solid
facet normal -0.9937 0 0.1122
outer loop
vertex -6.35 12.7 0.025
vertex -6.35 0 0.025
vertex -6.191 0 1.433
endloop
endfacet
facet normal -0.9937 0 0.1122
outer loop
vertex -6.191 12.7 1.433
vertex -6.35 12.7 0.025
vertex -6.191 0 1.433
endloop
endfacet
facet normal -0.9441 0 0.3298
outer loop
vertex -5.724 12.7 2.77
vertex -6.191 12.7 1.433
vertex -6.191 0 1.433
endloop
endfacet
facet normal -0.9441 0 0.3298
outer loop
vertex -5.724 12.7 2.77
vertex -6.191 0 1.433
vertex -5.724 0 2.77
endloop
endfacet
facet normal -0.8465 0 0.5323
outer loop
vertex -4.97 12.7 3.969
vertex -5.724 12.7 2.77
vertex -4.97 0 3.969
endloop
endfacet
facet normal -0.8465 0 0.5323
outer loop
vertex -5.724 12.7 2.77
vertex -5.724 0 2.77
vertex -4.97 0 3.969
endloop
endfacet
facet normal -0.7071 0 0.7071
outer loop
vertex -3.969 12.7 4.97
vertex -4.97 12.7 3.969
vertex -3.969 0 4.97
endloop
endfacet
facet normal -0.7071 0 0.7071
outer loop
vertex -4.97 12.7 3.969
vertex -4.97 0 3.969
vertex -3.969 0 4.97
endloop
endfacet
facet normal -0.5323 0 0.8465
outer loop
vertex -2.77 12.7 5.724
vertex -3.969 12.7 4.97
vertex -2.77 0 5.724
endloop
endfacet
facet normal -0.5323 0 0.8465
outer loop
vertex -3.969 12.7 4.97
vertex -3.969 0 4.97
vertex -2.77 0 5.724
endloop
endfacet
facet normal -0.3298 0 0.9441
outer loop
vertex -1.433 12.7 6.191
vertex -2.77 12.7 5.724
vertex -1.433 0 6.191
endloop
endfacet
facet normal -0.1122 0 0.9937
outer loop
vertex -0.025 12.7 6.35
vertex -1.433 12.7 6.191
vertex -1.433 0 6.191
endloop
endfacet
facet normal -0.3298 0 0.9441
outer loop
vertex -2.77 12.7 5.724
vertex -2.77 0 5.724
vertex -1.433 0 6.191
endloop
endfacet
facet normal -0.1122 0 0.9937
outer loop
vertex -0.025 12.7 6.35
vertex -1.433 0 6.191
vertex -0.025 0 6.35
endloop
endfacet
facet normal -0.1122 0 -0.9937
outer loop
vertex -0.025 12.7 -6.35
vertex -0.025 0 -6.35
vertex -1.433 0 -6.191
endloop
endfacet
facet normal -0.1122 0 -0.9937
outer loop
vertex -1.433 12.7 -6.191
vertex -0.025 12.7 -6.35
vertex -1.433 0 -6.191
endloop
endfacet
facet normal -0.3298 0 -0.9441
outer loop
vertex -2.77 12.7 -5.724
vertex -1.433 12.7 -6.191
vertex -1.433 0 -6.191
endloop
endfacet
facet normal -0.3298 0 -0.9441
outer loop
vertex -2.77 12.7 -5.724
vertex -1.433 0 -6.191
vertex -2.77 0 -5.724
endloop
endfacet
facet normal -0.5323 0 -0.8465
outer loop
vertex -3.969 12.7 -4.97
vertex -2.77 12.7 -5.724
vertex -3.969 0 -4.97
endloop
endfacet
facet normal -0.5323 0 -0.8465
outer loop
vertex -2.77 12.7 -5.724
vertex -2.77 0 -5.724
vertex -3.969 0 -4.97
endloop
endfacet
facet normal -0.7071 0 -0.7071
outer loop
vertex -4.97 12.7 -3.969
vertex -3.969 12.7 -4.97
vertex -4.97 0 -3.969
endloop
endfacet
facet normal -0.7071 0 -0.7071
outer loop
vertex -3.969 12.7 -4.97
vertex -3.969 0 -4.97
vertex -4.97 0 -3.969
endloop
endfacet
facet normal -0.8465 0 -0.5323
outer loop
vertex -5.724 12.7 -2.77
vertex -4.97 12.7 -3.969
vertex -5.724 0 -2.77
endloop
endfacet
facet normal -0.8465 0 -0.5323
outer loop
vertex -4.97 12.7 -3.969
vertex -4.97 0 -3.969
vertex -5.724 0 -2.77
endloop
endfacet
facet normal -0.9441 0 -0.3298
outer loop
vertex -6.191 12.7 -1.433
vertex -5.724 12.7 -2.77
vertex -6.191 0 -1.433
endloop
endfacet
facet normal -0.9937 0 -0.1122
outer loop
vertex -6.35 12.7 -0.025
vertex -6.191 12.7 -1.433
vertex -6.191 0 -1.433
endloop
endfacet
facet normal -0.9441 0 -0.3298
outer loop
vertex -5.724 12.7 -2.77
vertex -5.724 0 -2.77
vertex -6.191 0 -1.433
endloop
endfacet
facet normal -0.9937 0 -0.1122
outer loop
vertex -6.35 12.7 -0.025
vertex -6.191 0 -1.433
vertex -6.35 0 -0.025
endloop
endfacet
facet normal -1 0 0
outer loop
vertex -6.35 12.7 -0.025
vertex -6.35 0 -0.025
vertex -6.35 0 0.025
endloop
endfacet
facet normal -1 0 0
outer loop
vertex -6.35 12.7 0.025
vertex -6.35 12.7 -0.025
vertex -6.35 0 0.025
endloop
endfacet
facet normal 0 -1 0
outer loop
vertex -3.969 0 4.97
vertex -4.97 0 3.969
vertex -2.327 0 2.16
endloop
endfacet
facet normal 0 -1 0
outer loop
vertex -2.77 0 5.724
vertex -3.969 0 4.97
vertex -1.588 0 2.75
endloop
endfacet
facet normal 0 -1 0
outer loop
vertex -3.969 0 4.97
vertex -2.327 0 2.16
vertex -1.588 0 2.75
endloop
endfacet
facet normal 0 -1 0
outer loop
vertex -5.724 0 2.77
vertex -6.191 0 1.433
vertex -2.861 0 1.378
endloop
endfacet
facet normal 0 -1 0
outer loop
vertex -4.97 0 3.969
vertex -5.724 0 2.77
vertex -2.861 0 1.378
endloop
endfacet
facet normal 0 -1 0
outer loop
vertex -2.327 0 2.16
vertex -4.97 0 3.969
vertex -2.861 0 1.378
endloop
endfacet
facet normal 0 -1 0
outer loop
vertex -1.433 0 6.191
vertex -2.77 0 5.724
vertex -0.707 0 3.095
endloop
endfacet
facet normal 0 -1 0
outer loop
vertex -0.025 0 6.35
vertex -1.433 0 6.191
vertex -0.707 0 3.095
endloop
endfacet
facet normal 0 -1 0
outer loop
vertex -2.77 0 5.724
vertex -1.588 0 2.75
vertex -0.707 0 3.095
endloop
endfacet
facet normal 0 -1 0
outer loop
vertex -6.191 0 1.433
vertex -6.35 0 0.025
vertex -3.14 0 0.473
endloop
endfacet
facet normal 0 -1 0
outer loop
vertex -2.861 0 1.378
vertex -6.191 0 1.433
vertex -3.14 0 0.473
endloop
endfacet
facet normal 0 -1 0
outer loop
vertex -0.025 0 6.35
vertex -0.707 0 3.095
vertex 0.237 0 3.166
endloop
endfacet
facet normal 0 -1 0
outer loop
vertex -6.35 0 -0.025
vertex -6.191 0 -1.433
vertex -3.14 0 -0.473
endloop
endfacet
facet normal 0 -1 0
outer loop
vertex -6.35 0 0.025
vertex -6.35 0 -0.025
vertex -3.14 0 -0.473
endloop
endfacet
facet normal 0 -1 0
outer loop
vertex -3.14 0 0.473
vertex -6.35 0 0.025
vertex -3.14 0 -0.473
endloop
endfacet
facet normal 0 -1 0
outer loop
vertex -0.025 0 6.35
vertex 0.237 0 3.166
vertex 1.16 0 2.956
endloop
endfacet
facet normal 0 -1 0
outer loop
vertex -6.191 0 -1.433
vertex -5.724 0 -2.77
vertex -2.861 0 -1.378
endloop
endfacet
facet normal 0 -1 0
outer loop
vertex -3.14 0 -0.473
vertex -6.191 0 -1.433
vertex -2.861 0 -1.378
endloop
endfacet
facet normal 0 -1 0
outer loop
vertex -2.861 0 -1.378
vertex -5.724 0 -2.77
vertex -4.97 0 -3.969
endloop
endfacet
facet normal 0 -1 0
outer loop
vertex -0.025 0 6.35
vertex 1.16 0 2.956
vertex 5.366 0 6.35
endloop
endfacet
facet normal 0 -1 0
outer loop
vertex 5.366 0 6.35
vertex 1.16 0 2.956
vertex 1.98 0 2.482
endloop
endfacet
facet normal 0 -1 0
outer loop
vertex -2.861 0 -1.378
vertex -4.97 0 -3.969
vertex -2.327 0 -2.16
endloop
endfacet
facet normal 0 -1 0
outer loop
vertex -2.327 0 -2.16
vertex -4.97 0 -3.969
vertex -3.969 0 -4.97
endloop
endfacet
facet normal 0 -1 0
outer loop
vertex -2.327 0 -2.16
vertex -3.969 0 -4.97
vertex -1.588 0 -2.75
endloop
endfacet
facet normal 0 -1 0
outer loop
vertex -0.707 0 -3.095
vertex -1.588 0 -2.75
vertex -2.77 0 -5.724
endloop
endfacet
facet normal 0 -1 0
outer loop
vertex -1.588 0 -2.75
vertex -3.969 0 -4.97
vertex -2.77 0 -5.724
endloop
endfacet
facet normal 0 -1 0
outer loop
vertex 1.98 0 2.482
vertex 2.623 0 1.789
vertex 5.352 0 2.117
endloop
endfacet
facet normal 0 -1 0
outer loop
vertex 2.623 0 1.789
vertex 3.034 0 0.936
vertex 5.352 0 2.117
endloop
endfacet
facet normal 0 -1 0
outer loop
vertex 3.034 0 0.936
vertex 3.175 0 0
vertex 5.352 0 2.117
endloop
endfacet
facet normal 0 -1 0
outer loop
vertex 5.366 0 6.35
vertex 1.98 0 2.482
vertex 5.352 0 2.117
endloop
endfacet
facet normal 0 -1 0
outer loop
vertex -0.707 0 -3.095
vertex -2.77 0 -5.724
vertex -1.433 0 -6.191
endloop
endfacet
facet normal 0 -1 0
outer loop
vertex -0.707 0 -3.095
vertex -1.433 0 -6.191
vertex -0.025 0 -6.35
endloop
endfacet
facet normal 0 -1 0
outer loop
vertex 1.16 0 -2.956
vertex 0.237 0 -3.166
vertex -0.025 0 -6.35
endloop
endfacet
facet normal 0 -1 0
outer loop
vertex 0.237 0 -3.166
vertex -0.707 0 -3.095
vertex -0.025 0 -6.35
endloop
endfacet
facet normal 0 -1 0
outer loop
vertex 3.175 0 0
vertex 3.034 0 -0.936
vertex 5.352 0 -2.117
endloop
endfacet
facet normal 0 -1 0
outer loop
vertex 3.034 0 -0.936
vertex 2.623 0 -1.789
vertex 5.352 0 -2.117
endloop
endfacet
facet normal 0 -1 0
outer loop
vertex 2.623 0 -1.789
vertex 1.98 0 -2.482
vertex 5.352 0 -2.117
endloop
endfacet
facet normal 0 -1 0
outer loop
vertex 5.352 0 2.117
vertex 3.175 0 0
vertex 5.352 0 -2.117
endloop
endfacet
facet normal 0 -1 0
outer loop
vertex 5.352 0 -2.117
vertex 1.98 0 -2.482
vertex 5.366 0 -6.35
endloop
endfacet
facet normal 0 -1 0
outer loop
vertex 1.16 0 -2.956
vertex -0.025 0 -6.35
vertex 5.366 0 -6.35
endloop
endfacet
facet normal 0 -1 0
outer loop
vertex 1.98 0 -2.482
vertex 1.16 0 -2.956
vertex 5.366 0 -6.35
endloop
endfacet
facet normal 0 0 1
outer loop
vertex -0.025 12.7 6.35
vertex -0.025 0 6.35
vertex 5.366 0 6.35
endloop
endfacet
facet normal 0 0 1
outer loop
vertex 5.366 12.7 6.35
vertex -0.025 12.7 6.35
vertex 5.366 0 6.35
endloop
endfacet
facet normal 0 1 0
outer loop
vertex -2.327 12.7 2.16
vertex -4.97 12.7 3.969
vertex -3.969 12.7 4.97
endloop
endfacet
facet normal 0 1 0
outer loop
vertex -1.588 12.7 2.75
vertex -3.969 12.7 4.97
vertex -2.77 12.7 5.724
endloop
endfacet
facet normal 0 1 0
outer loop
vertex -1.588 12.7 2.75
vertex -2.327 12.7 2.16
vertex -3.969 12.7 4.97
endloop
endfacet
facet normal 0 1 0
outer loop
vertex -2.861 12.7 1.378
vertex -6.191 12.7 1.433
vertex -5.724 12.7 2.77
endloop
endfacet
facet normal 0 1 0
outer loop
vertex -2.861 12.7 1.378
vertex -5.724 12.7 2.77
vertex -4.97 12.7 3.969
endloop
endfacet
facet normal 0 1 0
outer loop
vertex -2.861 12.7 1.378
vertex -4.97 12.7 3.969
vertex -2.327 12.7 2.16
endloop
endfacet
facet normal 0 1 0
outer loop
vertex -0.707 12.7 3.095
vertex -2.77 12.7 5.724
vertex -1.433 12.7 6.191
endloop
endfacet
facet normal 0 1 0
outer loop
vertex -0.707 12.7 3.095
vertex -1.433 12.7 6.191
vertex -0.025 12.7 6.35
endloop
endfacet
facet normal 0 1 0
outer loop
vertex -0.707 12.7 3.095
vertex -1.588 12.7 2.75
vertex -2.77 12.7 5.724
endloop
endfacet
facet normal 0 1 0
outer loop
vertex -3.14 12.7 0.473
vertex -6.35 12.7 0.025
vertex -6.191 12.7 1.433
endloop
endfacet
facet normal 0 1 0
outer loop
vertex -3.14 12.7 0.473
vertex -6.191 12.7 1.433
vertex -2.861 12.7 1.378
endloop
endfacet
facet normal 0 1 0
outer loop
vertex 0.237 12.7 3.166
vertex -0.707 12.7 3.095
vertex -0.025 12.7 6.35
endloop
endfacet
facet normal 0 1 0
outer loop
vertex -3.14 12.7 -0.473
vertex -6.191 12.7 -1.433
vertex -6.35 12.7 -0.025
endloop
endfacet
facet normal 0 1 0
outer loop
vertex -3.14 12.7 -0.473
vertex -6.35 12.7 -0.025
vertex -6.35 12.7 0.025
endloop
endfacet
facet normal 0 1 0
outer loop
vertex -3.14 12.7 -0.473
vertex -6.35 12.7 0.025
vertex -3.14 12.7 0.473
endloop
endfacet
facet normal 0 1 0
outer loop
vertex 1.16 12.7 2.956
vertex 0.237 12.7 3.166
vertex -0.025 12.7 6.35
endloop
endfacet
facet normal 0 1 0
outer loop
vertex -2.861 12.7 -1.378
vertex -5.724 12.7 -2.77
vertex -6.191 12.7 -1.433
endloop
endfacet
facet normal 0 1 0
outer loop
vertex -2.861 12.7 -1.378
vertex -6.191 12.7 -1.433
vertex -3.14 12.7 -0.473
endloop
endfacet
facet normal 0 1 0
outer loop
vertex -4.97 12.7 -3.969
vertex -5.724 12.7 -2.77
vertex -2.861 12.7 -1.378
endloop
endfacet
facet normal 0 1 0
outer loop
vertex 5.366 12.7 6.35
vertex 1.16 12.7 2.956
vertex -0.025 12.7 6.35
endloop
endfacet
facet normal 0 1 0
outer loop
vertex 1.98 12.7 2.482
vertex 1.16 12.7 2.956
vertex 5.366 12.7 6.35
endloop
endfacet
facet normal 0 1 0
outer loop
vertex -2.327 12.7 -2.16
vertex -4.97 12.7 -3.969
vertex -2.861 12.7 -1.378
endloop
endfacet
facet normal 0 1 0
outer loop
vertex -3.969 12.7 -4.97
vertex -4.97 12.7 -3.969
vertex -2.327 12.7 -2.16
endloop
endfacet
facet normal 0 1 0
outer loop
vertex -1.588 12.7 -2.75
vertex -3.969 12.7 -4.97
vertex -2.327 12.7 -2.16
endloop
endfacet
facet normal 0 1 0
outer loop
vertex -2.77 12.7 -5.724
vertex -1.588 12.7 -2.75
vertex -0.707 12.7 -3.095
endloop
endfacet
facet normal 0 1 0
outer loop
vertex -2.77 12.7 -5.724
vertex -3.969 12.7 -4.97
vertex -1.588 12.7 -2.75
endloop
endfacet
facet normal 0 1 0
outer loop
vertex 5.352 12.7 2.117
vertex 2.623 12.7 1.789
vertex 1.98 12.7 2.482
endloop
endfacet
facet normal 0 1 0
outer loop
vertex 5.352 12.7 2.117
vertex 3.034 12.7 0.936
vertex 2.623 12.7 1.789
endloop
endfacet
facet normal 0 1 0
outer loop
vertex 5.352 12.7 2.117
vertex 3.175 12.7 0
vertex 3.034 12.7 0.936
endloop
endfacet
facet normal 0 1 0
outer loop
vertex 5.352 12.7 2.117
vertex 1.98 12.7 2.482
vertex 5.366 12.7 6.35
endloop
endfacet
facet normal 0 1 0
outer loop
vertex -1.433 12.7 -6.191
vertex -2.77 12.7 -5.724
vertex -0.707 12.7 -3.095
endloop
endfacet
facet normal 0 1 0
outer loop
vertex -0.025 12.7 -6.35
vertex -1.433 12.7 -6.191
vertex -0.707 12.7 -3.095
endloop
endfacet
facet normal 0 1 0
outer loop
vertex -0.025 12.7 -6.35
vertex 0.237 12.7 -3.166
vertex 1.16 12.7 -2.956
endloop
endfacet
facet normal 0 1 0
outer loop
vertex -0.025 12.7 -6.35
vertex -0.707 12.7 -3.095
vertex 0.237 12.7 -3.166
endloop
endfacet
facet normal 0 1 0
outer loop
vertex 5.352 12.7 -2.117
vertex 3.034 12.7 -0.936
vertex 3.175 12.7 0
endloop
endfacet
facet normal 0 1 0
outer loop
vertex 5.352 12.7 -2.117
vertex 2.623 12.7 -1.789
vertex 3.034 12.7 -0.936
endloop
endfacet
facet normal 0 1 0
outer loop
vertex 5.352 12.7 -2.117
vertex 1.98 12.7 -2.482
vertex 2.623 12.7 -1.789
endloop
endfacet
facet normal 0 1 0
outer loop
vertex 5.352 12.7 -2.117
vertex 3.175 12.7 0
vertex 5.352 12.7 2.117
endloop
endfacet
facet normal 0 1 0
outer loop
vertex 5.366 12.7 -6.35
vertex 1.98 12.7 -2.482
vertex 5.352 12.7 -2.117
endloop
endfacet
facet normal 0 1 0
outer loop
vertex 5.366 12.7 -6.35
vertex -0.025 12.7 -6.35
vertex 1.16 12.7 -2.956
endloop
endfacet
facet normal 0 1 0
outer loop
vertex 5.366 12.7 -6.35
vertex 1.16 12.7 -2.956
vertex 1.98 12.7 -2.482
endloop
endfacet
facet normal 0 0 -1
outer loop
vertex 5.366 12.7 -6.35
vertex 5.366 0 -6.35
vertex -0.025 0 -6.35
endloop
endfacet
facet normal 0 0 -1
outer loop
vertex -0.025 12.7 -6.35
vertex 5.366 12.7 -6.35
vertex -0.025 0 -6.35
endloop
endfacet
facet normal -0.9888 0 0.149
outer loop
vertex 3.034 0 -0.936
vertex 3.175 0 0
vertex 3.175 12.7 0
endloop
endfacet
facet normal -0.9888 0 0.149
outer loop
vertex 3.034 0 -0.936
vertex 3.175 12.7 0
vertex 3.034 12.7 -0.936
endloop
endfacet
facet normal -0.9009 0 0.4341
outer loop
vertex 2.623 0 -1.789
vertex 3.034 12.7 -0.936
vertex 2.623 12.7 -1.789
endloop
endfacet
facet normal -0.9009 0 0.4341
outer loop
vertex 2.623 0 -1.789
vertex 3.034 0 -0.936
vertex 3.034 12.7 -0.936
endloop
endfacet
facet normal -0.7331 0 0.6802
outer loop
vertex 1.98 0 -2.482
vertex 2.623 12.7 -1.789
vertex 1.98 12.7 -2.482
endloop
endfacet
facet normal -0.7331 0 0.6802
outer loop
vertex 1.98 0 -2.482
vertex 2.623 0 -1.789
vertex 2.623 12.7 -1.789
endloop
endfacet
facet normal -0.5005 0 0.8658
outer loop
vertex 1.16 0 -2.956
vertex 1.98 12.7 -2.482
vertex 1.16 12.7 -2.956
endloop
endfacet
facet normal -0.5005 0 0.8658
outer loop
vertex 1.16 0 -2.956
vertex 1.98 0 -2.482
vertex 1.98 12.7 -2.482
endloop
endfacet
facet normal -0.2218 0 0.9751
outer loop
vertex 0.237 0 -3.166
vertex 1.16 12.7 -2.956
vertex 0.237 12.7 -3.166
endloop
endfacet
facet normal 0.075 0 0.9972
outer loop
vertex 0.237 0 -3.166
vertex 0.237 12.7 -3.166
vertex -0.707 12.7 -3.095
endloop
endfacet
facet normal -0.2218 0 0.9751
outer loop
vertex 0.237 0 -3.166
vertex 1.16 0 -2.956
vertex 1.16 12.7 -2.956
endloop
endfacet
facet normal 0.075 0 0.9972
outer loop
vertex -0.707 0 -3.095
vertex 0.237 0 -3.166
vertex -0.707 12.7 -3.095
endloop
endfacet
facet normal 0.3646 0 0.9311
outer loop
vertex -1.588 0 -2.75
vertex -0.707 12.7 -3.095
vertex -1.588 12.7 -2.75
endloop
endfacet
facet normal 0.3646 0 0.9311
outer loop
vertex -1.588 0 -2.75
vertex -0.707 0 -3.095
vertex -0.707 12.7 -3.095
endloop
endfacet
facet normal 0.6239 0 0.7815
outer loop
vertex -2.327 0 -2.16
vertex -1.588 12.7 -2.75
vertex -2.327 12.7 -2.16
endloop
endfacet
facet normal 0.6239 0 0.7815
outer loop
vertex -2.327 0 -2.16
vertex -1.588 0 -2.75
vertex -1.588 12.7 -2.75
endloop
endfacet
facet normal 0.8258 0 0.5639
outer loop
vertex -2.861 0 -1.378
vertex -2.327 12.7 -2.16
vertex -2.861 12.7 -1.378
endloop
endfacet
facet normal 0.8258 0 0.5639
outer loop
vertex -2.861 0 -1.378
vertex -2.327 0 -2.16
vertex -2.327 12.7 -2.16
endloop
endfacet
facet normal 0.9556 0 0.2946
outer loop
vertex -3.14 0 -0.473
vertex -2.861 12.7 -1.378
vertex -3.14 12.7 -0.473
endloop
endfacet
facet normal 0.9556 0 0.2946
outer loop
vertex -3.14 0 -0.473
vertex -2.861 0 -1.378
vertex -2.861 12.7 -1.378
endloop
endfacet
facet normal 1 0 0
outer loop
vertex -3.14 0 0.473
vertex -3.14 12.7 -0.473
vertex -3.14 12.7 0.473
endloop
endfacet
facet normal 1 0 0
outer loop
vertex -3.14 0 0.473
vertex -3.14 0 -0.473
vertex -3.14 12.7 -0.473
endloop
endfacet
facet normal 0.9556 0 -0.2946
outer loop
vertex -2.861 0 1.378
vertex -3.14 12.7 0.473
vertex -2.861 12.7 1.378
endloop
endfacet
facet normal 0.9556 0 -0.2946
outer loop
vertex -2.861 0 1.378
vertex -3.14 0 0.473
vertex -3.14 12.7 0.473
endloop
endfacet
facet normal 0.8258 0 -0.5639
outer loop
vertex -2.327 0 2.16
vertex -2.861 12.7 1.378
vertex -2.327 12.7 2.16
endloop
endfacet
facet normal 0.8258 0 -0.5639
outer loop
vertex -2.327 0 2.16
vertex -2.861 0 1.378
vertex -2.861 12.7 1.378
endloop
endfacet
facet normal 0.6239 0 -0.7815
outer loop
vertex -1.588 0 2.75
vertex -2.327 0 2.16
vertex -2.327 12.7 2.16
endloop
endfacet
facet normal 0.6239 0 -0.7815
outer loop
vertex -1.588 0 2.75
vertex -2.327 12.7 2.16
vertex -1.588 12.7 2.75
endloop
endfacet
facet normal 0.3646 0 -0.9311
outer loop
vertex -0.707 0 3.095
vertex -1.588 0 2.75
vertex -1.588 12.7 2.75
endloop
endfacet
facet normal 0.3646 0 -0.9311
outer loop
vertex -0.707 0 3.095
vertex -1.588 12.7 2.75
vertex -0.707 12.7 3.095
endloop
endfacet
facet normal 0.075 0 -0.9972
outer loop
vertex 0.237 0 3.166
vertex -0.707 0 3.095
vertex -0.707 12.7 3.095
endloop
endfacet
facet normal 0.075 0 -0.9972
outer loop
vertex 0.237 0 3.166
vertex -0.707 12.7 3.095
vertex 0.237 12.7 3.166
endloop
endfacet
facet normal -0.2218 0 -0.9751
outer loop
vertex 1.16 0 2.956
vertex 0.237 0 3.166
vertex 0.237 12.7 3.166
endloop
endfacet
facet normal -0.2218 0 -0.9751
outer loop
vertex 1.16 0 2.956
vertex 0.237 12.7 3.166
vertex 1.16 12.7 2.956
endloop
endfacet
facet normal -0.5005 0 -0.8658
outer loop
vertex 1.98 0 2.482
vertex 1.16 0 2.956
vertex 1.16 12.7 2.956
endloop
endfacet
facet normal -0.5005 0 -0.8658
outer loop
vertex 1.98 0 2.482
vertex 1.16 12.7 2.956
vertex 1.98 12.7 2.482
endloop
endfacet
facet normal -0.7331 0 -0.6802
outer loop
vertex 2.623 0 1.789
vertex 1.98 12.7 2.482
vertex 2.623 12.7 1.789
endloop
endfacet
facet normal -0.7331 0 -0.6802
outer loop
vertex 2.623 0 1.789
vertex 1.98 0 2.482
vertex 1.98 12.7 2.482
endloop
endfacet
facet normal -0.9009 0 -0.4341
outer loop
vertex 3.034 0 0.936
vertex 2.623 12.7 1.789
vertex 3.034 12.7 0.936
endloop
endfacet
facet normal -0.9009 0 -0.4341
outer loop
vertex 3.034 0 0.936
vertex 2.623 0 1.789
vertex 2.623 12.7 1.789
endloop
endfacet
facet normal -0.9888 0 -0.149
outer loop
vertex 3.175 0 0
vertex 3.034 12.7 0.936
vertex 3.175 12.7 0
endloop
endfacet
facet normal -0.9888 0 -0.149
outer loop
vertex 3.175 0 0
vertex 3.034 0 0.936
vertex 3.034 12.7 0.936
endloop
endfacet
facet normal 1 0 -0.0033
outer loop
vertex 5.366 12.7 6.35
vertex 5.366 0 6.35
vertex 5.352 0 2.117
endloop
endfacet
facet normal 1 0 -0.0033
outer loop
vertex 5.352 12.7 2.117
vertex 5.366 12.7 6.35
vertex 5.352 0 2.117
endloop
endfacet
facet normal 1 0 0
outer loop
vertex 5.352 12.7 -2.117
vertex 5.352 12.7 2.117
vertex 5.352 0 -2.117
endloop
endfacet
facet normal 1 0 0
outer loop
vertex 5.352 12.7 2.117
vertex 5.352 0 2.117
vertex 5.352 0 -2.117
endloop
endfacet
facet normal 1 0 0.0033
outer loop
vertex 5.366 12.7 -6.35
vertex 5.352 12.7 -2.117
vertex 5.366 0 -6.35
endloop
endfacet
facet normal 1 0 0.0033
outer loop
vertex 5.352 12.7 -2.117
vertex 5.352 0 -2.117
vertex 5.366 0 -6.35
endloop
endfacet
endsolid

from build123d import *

# Parameters (mm, degrees)
SKETCH1_R           = 3.175
BOSS_EXTRUDE1_DEPTH = 12.7


with BuildPart() as part:
    # Sketch1 → Boss-Extrude1 (new body)
    with BuildSketch(Plane(origin=(0, 0, 0), x_dir=(1, 0, 0), z_dir=(0, 1, 0))):
        with BuildLine():
            Line((-0.0254, -6.35), (5.366129104, -6.35))
            ThreePointArc((5.366129104, -6.35), (5.35, 0), (5.366129104, 6.35))
            Line((5.366129104, 6.35), (-0.0254, 6.35))
            ThreePointArc((-0.0254, 6.35), (-4.497567548, 4.497567548), (-6.35, 0.0254))
            Line((-6.35, 0.0254), (-6.35, -0.0254))
            ThreePointArc((-6.35, -0.0254), (-4.497567548, -4.497567548), (-0.0254, -6.35))
        make_face()
        Circle(SKETCH1_R, mode=Mode.SUBTRACT)
    extrude(amount=BOSS_EXTRUDE1_DEPTH)


solid = part.part
